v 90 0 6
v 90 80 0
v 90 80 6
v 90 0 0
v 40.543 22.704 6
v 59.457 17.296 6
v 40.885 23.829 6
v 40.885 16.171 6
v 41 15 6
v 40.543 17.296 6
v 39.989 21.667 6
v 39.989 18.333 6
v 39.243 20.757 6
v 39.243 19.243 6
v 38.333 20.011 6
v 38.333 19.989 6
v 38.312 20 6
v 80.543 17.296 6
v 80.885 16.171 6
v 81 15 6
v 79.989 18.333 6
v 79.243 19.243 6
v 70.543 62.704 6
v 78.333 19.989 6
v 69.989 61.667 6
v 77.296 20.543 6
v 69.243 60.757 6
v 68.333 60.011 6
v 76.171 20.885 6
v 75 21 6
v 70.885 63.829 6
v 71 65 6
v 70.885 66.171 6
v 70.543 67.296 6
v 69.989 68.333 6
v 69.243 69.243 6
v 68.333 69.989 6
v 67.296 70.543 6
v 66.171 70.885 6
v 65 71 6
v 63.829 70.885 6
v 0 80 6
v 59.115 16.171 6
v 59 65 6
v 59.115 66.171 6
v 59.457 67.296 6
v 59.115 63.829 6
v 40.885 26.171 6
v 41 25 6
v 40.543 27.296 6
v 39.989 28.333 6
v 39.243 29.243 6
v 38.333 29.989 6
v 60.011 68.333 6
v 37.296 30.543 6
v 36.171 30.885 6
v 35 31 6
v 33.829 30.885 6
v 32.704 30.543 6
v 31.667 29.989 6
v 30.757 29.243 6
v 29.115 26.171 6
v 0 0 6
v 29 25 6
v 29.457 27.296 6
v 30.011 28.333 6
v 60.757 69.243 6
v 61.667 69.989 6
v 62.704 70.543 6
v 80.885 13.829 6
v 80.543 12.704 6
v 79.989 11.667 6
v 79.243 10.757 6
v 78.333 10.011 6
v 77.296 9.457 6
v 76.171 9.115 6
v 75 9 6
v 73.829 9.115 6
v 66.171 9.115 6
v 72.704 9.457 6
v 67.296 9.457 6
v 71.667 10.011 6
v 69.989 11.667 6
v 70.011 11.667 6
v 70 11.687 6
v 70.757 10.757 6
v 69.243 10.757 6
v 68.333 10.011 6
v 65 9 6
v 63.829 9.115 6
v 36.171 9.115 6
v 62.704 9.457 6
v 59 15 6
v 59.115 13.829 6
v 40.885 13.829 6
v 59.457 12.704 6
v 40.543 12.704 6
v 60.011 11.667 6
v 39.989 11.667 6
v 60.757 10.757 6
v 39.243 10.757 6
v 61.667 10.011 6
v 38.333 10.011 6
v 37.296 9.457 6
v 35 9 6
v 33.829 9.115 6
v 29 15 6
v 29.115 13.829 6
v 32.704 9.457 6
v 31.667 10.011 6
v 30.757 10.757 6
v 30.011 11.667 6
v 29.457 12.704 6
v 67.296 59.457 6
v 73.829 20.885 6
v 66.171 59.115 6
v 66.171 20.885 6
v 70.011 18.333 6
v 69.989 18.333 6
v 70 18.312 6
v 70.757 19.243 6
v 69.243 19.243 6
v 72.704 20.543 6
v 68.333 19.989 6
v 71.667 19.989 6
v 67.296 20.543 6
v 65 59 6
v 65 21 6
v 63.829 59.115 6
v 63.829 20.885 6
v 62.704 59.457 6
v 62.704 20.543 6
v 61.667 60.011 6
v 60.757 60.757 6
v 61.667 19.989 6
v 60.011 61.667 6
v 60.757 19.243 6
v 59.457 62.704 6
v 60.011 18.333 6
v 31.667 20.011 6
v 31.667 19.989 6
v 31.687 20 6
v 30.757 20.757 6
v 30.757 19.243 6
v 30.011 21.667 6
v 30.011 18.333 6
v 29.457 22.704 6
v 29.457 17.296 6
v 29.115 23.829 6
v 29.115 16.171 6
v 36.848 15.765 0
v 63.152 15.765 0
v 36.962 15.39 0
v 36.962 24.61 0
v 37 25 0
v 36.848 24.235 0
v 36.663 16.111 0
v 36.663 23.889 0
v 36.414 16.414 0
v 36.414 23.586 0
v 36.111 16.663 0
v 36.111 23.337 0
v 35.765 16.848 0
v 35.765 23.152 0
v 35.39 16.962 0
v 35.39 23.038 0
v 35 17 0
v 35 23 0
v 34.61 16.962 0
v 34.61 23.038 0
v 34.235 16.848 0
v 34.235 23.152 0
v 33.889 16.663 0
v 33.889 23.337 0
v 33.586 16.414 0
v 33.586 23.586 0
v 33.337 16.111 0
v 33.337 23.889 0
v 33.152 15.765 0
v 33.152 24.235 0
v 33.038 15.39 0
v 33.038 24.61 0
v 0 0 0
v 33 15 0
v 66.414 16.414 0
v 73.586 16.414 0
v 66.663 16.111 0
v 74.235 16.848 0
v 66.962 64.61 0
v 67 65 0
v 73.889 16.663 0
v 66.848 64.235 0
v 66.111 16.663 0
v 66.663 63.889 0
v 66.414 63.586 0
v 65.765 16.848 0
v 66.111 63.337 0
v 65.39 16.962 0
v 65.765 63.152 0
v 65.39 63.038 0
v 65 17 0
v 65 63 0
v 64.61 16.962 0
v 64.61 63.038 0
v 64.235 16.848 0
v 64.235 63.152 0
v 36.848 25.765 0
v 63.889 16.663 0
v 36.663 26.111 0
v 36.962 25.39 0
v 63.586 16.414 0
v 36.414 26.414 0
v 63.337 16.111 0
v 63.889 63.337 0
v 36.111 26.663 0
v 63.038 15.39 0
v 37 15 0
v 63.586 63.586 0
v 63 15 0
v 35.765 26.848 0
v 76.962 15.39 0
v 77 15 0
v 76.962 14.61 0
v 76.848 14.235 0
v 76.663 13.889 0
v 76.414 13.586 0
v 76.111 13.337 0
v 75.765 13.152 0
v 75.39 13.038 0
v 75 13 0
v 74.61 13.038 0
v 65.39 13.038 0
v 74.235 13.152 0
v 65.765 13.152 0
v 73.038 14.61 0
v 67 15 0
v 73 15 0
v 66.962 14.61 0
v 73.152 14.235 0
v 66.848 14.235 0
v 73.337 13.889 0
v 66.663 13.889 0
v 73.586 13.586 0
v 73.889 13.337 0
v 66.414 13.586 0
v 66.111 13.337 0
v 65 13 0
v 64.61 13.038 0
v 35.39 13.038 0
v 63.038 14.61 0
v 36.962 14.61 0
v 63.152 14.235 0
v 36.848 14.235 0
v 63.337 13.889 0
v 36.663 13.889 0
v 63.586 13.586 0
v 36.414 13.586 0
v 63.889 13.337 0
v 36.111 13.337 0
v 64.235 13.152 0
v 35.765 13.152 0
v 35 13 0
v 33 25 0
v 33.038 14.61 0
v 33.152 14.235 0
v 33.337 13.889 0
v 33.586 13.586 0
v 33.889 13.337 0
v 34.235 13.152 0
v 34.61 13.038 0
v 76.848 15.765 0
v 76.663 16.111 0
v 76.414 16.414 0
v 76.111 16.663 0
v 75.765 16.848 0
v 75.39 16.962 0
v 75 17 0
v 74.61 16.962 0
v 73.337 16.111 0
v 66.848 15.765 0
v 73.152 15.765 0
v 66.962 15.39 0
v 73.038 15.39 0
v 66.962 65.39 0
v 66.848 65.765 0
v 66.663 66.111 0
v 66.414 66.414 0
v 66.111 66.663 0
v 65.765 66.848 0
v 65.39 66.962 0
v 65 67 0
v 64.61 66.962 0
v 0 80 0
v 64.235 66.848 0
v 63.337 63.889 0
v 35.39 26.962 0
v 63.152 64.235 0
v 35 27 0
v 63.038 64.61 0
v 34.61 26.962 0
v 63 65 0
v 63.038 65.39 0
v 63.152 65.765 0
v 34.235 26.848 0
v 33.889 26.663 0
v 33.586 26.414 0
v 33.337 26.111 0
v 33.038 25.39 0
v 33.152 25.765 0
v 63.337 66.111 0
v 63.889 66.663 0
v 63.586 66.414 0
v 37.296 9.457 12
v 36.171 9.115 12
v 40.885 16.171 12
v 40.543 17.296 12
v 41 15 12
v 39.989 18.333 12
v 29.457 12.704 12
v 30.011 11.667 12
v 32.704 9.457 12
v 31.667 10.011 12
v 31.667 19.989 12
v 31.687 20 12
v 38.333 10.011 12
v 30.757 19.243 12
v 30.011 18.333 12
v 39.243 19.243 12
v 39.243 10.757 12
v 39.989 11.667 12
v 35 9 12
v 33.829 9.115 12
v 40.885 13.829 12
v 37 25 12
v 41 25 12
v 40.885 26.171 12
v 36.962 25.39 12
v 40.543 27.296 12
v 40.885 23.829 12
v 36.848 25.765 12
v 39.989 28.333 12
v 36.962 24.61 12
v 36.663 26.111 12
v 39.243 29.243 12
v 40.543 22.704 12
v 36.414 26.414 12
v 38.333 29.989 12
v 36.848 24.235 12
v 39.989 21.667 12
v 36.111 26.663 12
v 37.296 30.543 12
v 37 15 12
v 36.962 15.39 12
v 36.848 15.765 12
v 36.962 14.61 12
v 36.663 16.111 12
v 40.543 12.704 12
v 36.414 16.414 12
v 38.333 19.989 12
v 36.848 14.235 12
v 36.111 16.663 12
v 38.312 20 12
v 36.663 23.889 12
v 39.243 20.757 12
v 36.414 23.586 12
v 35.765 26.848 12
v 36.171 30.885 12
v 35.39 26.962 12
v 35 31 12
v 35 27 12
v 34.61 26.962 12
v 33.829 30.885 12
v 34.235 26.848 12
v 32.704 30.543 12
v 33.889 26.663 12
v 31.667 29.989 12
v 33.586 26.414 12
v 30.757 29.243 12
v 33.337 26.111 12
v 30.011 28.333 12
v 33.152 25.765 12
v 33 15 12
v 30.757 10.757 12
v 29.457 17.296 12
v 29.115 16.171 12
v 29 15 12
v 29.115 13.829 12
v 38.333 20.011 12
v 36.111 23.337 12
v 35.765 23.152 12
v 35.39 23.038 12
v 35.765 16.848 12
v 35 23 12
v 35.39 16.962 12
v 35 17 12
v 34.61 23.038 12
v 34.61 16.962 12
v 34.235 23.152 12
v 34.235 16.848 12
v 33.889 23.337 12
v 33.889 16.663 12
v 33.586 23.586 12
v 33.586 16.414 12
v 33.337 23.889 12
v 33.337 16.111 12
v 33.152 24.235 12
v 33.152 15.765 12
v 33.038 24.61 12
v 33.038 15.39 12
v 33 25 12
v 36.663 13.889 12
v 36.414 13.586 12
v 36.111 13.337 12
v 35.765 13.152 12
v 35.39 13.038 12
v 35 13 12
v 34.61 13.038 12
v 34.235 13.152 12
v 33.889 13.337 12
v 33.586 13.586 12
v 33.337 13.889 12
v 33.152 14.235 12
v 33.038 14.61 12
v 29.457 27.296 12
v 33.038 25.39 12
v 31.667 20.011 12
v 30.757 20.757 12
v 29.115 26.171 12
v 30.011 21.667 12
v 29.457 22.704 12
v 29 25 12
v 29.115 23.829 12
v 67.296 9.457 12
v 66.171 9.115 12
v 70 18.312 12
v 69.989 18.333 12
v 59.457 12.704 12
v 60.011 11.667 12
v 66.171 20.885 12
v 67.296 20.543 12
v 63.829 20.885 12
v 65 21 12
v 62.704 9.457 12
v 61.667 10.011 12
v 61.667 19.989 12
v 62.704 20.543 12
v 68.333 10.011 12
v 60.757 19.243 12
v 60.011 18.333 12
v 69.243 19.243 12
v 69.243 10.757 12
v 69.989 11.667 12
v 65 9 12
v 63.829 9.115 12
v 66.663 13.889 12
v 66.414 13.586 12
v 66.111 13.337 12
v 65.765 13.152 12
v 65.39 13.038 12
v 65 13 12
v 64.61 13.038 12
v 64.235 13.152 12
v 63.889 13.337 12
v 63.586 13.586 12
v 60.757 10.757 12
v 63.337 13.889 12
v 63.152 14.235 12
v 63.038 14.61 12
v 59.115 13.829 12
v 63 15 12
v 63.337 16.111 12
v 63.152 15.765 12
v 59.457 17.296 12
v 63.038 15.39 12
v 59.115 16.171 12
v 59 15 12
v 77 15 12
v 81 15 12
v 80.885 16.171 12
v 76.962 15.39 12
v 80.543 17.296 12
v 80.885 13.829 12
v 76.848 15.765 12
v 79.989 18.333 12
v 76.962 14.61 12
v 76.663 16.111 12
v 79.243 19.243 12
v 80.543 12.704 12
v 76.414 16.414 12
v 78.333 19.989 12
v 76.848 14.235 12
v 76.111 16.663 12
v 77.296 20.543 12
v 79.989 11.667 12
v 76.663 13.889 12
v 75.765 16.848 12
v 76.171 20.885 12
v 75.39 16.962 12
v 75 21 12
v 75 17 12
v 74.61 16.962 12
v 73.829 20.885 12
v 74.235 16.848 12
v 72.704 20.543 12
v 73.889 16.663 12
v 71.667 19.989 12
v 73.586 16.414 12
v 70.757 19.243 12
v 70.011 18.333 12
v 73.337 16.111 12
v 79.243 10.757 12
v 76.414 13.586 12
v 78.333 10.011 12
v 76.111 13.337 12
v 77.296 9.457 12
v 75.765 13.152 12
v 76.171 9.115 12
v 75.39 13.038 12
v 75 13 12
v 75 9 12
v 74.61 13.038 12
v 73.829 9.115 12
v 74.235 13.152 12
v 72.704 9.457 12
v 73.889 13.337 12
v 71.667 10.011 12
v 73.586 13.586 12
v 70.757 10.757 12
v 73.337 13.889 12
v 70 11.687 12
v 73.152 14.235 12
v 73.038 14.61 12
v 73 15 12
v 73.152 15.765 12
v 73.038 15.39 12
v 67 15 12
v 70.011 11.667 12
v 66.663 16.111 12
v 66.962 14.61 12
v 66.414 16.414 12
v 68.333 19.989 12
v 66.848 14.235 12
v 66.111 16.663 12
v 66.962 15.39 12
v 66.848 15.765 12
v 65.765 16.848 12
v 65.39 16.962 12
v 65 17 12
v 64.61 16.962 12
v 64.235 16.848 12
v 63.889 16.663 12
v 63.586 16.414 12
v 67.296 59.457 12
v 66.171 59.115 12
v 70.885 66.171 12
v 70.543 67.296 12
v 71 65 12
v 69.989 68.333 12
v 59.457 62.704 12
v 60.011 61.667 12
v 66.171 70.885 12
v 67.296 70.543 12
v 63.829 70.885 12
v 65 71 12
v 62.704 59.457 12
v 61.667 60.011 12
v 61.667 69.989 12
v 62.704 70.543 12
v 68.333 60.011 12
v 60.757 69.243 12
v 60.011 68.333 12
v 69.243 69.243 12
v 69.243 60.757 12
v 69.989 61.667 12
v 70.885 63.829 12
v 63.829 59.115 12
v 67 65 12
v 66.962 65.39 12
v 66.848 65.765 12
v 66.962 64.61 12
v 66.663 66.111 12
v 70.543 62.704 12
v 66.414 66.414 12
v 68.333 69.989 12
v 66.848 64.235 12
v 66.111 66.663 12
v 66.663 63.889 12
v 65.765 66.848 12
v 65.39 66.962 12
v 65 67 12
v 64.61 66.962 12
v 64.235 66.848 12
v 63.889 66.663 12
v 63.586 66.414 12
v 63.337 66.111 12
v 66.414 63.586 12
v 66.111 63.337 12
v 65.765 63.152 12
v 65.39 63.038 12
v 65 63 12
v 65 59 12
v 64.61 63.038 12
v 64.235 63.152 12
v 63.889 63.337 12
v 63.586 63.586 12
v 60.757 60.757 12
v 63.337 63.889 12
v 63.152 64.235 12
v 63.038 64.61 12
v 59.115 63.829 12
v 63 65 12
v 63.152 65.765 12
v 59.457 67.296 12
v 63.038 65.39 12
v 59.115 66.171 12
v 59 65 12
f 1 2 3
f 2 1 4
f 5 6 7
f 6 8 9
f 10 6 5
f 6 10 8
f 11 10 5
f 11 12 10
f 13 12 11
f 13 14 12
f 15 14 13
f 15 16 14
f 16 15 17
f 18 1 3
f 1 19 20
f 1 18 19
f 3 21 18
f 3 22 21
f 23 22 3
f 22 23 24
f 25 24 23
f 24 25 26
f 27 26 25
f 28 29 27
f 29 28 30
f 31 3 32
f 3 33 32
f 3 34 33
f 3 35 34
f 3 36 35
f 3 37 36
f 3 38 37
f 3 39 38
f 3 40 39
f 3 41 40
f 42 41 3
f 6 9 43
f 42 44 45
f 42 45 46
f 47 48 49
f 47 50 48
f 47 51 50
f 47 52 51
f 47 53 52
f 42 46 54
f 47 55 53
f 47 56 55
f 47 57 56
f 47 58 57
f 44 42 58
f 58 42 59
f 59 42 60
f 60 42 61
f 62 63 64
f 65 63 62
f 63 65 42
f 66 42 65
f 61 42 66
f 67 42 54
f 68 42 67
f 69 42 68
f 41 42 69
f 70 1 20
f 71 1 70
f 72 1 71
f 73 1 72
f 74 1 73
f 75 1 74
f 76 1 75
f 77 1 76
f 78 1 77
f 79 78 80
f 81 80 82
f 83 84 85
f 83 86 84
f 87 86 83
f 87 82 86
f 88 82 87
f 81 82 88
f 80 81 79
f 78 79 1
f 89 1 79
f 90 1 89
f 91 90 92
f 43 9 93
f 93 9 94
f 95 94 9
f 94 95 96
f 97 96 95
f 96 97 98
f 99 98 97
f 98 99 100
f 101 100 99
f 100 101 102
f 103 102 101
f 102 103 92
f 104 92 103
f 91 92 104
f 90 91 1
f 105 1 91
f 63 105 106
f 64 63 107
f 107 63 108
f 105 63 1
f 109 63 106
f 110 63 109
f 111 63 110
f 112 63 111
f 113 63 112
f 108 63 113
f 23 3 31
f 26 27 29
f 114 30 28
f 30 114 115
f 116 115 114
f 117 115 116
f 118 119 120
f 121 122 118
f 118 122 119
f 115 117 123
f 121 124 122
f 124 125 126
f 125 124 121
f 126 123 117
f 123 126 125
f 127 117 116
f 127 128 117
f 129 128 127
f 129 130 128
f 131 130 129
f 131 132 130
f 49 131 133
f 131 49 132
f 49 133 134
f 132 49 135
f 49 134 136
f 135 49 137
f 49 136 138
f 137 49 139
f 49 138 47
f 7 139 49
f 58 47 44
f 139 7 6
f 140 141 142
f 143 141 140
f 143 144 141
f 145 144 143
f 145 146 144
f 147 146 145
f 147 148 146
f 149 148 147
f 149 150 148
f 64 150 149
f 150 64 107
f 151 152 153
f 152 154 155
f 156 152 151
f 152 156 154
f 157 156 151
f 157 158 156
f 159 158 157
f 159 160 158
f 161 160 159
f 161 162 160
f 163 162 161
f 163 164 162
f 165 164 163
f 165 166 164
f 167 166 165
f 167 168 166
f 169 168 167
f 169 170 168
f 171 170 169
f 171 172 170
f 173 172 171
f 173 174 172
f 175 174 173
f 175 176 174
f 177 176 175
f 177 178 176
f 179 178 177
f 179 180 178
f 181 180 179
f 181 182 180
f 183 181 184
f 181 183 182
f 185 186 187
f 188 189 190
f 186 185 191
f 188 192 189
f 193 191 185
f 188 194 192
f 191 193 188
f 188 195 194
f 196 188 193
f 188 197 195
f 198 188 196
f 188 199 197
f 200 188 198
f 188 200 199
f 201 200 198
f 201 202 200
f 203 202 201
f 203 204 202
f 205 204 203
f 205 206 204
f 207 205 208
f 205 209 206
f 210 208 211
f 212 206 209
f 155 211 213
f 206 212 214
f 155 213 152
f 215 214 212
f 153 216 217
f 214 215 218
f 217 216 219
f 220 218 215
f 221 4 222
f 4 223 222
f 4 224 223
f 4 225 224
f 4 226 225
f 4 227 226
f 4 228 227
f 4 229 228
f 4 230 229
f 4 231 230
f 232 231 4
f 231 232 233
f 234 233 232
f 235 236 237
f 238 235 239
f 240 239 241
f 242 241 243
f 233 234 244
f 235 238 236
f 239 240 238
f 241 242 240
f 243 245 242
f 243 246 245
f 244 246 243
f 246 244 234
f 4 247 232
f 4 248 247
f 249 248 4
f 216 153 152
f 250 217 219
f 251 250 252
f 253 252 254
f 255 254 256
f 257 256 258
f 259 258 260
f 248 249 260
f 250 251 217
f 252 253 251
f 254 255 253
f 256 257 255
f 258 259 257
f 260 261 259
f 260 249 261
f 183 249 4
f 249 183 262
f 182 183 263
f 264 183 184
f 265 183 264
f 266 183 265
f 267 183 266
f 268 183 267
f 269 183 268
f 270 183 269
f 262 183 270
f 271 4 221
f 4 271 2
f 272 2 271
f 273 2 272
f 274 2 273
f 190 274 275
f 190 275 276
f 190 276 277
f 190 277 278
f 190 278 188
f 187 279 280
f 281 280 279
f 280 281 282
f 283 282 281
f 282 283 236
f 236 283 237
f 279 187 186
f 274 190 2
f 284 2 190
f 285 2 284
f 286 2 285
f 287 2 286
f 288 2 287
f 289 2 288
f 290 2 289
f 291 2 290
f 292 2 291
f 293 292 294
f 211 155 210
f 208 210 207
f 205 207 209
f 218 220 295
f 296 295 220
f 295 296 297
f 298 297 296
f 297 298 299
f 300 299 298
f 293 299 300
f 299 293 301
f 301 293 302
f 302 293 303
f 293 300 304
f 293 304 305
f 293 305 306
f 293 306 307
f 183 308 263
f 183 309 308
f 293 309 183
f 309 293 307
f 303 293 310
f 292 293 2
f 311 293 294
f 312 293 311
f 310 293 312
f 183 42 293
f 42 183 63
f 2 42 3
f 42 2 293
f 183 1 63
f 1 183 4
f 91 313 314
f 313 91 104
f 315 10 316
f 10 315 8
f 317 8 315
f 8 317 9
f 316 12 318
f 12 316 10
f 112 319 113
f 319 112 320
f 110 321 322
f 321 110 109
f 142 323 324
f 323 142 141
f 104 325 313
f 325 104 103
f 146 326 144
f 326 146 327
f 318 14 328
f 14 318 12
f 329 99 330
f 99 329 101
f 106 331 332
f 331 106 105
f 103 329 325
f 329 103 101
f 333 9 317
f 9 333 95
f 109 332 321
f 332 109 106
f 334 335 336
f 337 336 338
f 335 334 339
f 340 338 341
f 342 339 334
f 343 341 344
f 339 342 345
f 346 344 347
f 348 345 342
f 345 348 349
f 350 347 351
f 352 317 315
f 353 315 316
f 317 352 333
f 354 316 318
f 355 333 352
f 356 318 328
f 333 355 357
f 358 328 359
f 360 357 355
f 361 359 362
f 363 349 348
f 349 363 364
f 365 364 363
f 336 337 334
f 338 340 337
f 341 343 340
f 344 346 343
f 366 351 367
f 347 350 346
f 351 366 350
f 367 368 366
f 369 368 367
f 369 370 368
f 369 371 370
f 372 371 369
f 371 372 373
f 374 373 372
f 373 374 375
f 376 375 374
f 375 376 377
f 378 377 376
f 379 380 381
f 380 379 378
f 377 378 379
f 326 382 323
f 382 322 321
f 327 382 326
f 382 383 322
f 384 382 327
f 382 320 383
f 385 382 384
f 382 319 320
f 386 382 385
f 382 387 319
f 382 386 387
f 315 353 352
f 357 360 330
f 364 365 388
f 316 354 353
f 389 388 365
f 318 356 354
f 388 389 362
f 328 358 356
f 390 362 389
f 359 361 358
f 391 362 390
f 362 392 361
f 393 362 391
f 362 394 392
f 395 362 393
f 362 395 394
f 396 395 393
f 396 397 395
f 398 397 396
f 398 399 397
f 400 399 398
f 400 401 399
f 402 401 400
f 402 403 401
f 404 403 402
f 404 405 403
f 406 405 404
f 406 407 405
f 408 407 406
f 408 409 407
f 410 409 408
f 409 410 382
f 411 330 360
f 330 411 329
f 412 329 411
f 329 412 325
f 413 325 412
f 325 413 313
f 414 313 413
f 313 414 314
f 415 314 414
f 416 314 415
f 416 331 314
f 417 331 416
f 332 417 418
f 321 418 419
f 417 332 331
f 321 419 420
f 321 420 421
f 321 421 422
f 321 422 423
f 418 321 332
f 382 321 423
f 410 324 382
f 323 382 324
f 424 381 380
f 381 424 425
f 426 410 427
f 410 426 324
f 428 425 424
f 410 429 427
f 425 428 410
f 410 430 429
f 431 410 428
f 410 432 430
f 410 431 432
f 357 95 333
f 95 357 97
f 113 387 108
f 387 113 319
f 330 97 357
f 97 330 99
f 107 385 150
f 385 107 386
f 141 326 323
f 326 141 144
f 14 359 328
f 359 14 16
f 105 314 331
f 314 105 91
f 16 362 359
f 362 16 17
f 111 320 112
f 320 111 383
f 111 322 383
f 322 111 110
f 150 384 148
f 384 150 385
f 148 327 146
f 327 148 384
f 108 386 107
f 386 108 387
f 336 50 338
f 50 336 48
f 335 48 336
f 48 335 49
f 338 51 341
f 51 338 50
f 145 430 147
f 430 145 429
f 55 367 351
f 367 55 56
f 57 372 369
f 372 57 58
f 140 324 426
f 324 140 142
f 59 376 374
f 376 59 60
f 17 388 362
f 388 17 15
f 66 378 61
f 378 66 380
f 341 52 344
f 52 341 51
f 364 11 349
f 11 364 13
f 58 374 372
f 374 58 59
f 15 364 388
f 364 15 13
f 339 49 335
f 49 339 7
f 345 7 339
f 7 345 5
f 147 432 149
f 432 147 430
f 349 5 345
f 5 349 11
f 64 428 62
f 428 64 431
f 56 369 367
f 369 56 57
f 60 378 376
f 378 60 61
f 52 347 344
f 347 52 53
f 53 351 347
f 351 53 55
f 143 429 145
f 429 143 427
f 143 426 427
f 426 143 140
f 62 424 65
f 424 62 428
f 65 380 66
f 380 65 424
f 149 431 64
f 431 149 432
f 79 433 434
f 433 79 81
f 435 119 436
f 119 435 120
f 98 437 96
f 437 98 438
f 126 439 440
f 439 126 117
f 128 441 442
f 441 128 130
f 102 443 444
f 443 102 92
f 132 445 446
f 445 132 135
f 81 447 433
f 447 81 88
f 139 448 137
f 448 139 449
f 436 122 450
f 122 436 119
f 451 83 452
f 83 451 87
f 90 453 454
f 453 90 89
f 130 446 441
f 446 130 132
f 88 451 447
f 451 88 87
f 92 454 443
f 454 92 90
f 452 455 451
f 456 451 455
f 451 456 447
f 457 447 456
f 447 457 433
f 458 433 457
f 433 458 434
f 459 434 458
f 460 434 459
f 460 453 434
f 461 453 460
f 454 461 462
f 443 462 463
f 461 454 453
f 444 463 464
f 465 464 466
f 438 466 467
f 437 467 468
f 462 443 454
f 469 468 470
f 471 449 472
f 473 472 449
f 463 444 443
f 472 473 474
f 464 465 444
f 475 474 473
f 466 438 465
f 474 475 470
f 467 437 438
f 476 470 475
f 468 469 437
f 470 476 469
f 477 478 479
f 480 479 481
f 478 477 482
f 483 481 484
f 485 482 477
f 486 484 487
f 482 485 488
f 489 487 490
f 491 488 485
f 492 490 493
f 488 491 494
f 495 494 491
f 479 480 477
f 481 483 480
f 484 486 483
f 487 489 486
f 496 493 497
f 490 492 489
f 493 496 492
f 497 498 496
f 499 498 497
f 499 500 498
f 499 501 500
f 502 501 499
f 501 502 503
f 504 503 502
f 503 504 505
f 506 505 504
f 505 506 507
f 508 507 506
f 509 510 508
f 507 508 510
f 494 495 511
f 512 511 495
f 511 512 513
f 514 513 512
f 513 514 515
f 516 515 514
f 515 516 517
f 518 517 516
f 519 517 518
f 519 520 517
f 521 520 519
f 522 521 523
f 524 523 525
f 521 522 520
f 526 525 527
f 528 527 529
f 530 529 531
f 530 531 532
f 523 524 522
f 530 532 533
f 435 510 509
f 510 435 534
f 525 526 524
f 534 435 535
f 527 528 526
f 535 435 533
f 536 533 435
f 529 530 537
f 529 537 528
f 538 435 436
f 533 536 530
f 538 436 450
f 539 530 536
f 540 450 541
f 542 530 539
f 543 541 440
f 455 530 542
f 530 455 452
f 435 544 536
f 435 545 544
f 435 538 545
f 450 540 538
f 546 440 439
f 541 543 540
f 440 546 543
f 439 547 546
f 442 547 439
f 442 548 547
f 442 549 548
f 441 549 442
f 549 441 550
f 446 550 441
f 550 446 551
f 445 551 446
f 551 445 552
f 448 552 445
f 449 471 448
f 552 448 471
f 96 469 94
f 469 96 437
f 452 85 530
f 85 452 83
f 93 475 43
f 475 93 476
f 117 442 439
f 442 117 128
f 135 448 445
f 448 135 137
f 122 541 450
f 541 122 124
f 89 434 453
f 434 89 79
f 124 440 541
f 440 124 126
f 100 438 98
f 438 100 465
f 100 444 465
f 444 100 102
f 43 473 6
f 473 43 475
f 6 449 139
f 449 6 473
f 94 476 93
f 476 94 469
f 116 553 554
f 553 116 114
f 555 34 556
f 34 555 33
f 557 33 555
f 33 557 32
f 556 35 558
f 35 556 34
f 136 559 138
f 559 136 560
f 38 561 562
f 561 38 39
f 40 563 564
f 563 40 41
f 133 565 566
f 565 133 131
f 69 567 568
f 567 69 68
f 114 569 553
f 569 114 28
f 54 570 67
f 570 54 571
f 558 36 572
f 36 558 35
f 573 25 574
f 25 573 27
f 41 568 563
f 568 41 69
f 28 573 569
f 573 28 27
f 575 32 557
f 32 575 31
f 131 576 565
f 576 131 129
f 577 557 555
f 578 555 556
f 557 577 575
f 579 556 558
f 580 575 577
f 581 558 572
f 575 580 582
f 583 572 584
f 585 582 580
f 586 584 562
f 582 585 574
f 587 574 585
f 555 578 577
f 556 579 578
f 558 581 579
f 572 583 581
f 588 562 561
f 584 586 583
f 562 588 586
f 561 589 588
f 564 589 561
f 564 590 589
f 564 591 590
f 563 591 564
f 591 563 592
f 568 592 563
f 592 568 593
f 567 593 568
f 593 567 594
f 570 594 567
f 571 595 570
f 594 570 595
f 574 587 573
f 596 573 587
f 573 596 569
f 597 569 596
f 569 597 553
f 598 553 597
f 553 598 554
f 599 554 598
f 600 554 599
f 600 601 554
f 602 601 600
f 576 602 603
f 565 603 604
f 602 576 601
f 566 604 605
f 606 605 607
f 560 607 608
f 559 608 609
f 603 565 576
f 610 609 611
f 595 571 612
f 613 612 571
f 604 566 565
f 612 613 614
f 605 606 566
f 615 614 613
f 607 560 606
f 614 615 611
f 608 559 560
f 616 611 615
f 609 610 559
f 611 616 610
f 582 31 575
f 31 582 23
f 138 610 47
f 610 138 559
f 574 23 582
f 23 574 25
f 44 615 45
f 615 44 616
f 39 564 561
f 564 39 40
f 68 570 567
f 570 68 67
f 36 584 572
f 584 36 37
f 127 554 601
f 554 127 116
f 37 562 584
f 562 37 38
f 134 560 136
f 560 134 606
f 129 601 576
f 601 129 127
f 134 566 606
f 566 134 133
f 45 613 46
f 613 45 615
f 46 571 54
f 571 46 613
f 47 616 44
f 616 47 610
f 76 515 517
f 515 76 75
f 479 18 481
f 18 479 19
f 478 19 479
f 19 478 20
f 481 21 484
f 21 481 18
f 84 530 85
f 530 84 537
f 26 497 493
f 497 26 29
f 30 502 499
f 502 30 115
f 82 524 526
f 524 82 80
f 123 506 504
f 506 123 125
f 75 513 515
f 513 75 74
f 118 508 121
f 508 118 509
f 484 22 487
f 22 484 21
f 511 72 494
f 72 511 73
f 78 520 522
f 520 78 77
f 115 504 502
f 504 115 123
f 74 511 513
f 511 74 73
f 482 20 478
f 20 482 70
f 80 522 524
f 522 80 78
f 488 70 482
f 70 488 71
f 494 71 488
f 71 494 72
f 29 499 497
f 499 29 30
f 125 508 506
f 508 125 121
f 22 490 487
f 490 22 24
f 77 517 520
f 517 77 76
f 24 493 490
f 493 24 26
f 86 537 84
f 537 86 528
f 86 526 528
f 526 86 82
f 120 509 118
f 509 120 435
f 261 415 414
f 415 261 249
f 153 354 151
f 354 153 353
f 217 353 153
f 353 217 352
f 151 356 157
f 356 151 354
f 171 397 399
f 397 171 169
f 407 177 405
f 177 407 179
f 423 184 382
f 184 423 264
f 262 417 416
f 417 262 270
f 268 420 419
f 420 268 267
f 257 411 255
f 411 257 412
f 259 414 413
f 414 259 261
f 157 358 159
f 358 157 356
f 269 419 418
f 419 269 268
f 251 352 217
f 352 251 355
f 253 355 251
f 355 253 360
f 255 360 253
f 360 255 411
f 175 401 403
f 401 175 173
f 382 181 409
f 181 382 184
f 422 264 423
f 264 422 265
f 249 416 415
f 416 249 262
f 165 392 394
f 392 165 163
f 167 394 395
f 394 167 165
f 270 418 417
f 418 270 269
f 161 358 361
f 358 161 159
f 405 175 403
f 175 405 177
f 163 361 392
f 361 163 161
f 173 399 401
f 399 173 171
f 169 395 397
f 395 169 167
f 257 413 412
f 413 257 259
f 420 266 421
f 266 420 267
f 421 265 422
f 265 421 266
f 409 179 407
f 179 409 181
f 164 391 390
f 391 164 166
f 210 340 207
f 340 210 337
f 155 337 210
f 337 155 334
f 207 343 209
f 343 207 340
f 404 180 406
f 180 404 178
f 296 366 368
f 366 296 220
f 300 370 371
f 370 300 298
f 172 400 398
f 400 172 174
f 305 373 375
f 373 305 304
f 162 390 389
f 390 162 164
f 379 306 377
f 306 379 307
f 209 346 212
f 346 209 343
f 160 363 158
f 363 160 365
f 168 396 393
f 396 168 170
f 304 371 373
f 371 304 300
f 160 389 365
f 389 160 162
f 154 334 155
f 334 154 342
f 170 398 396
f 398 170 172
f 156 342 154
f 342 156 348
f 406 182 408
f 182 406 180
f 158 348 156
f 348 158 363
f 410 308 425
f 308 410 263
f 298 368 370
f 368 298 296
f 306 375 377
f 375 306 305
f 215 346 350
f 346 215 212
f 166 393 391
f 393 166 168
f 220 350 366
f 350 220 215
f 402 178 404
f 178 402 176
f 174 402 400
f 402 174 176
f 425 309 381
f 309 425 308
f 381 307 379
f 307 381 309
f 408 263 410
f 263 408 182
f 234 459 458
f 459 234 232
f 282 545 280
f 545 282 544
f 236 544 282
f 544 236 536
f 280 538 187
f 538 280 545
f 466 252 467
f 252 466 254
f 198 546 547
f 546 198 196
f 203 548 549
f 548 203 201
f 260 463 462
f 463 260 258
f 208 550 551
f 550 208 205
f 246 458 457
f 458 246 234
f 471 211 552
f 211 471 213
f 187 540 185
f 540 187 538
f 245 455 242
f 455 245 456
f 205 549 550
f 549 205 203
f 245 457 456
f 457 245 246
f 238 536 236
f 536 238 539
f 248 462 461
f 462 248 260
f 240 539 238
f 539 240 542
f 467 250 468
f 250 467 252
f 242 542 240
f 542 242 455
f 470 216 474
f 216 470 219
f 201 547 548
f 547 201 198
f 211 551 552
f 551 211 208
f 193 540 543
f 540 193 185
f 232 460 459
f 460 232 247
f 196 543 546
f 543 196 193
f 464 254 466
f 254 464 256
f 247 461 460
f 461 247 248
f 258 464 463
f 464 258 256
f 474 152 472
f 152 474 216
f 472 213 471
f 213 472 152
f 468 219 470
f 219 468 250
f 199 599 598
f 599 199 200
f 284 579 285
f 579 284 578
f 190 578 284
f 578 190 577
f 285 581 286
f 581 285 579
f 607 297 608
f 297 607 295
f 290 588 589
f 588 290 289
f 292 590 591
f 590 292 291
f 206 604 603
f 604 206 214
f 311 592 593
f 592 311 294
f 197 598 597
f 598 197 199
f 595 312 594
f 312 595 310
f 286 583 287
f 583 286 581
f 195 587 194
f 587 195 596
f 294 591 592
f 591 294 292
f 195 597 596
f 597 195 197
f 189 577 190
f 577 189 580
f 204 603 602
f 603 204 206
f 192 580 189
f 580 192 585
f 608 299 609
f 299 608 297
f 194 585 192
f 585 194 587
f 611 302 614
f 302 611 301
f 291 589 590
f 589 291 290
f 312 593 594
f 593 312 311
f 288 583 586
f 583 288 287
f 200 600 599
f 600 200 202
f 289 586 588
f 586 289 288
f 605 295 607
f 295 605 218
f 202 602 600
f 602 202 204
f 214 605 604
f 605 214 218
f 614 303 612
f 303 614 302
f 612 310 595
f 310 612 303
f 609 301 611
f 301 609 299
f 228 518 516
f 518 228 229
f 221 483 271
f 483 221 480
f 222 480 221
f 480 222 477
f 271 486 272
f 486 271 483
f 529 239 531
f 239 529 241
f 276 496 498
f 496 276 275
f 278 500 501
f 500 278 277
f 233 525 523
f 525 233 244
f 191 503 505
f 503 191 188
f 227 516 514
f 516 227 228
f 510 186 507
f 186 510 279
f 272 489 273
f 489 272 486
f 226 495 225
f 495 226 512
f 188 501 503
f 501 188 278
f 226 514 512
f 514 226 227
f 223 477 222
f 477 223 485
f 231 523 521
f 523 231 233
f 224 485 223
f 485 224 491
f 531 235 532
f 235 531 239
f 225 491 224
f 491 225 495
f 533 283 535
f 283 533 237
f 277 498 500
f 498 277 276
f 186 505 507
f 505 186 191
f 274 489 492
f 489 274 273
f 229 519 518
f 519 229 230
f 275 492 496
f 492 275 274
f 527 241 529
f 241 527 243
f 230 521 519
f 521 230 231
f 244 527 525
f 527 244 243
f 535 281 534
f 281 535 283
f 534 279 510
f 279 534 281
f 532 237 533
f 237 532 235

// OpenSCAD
$fn = 32;

// ----------------------------------------------------------------------
// Boss field: plate with bosses at given coordinates
// ----------------------------------------------------------------------

// --- parameters (mm) ---
plate_l = 90;             // plate length, X
plate_w = 80;             // plate width, Y
plate_t = 6;              // plate thickness, Z
boss_d = 12;              // boss diameter
boss_h = 6;               // boss height above the plate
bore_d = 4;               // boss bore
fit_tol = 0.02;           // tolerance for press fits, mm
free_tol = 0.2;           // tolerance for clearance fits, mm

total_h = plate_t + boss_h;  // overall height

difference() {
  union() {
    cube([plate_l, plate_w, plate_t]);
    translate([35, 15, plate_t]) cylinder(h = boss_h, d = boss_d);
    translate([35, 25, plate_t]) cylinder(h = boss_h, d = boss_d);
    translate([65, 15, plate_t]) cylinder(h = boss_h, d = boss_d);
    translate([65, 65, plate_t]) cylinder(h = boss_h, d = boss_d);
    translate([75, 15, plate_t]) cylinder(h = boss_h, d = boss_d);
  }
  translate([35, 15, -1]) cylinder(h = total_h + 2, d = bore_d);
  translate([35, 25, -1]) cylinder(h = total_h + 2, d = bore_d);
  translate([65, 15, -1]) cylinder(h = total_h + 2, d = bore_d);
  translate([65, 65, -1]) cylinder(h = total_h + 2, d = bore_d);
  translate([75, 15, -1]) cylinder(h = total_h + 2, d = bore_d);
}
